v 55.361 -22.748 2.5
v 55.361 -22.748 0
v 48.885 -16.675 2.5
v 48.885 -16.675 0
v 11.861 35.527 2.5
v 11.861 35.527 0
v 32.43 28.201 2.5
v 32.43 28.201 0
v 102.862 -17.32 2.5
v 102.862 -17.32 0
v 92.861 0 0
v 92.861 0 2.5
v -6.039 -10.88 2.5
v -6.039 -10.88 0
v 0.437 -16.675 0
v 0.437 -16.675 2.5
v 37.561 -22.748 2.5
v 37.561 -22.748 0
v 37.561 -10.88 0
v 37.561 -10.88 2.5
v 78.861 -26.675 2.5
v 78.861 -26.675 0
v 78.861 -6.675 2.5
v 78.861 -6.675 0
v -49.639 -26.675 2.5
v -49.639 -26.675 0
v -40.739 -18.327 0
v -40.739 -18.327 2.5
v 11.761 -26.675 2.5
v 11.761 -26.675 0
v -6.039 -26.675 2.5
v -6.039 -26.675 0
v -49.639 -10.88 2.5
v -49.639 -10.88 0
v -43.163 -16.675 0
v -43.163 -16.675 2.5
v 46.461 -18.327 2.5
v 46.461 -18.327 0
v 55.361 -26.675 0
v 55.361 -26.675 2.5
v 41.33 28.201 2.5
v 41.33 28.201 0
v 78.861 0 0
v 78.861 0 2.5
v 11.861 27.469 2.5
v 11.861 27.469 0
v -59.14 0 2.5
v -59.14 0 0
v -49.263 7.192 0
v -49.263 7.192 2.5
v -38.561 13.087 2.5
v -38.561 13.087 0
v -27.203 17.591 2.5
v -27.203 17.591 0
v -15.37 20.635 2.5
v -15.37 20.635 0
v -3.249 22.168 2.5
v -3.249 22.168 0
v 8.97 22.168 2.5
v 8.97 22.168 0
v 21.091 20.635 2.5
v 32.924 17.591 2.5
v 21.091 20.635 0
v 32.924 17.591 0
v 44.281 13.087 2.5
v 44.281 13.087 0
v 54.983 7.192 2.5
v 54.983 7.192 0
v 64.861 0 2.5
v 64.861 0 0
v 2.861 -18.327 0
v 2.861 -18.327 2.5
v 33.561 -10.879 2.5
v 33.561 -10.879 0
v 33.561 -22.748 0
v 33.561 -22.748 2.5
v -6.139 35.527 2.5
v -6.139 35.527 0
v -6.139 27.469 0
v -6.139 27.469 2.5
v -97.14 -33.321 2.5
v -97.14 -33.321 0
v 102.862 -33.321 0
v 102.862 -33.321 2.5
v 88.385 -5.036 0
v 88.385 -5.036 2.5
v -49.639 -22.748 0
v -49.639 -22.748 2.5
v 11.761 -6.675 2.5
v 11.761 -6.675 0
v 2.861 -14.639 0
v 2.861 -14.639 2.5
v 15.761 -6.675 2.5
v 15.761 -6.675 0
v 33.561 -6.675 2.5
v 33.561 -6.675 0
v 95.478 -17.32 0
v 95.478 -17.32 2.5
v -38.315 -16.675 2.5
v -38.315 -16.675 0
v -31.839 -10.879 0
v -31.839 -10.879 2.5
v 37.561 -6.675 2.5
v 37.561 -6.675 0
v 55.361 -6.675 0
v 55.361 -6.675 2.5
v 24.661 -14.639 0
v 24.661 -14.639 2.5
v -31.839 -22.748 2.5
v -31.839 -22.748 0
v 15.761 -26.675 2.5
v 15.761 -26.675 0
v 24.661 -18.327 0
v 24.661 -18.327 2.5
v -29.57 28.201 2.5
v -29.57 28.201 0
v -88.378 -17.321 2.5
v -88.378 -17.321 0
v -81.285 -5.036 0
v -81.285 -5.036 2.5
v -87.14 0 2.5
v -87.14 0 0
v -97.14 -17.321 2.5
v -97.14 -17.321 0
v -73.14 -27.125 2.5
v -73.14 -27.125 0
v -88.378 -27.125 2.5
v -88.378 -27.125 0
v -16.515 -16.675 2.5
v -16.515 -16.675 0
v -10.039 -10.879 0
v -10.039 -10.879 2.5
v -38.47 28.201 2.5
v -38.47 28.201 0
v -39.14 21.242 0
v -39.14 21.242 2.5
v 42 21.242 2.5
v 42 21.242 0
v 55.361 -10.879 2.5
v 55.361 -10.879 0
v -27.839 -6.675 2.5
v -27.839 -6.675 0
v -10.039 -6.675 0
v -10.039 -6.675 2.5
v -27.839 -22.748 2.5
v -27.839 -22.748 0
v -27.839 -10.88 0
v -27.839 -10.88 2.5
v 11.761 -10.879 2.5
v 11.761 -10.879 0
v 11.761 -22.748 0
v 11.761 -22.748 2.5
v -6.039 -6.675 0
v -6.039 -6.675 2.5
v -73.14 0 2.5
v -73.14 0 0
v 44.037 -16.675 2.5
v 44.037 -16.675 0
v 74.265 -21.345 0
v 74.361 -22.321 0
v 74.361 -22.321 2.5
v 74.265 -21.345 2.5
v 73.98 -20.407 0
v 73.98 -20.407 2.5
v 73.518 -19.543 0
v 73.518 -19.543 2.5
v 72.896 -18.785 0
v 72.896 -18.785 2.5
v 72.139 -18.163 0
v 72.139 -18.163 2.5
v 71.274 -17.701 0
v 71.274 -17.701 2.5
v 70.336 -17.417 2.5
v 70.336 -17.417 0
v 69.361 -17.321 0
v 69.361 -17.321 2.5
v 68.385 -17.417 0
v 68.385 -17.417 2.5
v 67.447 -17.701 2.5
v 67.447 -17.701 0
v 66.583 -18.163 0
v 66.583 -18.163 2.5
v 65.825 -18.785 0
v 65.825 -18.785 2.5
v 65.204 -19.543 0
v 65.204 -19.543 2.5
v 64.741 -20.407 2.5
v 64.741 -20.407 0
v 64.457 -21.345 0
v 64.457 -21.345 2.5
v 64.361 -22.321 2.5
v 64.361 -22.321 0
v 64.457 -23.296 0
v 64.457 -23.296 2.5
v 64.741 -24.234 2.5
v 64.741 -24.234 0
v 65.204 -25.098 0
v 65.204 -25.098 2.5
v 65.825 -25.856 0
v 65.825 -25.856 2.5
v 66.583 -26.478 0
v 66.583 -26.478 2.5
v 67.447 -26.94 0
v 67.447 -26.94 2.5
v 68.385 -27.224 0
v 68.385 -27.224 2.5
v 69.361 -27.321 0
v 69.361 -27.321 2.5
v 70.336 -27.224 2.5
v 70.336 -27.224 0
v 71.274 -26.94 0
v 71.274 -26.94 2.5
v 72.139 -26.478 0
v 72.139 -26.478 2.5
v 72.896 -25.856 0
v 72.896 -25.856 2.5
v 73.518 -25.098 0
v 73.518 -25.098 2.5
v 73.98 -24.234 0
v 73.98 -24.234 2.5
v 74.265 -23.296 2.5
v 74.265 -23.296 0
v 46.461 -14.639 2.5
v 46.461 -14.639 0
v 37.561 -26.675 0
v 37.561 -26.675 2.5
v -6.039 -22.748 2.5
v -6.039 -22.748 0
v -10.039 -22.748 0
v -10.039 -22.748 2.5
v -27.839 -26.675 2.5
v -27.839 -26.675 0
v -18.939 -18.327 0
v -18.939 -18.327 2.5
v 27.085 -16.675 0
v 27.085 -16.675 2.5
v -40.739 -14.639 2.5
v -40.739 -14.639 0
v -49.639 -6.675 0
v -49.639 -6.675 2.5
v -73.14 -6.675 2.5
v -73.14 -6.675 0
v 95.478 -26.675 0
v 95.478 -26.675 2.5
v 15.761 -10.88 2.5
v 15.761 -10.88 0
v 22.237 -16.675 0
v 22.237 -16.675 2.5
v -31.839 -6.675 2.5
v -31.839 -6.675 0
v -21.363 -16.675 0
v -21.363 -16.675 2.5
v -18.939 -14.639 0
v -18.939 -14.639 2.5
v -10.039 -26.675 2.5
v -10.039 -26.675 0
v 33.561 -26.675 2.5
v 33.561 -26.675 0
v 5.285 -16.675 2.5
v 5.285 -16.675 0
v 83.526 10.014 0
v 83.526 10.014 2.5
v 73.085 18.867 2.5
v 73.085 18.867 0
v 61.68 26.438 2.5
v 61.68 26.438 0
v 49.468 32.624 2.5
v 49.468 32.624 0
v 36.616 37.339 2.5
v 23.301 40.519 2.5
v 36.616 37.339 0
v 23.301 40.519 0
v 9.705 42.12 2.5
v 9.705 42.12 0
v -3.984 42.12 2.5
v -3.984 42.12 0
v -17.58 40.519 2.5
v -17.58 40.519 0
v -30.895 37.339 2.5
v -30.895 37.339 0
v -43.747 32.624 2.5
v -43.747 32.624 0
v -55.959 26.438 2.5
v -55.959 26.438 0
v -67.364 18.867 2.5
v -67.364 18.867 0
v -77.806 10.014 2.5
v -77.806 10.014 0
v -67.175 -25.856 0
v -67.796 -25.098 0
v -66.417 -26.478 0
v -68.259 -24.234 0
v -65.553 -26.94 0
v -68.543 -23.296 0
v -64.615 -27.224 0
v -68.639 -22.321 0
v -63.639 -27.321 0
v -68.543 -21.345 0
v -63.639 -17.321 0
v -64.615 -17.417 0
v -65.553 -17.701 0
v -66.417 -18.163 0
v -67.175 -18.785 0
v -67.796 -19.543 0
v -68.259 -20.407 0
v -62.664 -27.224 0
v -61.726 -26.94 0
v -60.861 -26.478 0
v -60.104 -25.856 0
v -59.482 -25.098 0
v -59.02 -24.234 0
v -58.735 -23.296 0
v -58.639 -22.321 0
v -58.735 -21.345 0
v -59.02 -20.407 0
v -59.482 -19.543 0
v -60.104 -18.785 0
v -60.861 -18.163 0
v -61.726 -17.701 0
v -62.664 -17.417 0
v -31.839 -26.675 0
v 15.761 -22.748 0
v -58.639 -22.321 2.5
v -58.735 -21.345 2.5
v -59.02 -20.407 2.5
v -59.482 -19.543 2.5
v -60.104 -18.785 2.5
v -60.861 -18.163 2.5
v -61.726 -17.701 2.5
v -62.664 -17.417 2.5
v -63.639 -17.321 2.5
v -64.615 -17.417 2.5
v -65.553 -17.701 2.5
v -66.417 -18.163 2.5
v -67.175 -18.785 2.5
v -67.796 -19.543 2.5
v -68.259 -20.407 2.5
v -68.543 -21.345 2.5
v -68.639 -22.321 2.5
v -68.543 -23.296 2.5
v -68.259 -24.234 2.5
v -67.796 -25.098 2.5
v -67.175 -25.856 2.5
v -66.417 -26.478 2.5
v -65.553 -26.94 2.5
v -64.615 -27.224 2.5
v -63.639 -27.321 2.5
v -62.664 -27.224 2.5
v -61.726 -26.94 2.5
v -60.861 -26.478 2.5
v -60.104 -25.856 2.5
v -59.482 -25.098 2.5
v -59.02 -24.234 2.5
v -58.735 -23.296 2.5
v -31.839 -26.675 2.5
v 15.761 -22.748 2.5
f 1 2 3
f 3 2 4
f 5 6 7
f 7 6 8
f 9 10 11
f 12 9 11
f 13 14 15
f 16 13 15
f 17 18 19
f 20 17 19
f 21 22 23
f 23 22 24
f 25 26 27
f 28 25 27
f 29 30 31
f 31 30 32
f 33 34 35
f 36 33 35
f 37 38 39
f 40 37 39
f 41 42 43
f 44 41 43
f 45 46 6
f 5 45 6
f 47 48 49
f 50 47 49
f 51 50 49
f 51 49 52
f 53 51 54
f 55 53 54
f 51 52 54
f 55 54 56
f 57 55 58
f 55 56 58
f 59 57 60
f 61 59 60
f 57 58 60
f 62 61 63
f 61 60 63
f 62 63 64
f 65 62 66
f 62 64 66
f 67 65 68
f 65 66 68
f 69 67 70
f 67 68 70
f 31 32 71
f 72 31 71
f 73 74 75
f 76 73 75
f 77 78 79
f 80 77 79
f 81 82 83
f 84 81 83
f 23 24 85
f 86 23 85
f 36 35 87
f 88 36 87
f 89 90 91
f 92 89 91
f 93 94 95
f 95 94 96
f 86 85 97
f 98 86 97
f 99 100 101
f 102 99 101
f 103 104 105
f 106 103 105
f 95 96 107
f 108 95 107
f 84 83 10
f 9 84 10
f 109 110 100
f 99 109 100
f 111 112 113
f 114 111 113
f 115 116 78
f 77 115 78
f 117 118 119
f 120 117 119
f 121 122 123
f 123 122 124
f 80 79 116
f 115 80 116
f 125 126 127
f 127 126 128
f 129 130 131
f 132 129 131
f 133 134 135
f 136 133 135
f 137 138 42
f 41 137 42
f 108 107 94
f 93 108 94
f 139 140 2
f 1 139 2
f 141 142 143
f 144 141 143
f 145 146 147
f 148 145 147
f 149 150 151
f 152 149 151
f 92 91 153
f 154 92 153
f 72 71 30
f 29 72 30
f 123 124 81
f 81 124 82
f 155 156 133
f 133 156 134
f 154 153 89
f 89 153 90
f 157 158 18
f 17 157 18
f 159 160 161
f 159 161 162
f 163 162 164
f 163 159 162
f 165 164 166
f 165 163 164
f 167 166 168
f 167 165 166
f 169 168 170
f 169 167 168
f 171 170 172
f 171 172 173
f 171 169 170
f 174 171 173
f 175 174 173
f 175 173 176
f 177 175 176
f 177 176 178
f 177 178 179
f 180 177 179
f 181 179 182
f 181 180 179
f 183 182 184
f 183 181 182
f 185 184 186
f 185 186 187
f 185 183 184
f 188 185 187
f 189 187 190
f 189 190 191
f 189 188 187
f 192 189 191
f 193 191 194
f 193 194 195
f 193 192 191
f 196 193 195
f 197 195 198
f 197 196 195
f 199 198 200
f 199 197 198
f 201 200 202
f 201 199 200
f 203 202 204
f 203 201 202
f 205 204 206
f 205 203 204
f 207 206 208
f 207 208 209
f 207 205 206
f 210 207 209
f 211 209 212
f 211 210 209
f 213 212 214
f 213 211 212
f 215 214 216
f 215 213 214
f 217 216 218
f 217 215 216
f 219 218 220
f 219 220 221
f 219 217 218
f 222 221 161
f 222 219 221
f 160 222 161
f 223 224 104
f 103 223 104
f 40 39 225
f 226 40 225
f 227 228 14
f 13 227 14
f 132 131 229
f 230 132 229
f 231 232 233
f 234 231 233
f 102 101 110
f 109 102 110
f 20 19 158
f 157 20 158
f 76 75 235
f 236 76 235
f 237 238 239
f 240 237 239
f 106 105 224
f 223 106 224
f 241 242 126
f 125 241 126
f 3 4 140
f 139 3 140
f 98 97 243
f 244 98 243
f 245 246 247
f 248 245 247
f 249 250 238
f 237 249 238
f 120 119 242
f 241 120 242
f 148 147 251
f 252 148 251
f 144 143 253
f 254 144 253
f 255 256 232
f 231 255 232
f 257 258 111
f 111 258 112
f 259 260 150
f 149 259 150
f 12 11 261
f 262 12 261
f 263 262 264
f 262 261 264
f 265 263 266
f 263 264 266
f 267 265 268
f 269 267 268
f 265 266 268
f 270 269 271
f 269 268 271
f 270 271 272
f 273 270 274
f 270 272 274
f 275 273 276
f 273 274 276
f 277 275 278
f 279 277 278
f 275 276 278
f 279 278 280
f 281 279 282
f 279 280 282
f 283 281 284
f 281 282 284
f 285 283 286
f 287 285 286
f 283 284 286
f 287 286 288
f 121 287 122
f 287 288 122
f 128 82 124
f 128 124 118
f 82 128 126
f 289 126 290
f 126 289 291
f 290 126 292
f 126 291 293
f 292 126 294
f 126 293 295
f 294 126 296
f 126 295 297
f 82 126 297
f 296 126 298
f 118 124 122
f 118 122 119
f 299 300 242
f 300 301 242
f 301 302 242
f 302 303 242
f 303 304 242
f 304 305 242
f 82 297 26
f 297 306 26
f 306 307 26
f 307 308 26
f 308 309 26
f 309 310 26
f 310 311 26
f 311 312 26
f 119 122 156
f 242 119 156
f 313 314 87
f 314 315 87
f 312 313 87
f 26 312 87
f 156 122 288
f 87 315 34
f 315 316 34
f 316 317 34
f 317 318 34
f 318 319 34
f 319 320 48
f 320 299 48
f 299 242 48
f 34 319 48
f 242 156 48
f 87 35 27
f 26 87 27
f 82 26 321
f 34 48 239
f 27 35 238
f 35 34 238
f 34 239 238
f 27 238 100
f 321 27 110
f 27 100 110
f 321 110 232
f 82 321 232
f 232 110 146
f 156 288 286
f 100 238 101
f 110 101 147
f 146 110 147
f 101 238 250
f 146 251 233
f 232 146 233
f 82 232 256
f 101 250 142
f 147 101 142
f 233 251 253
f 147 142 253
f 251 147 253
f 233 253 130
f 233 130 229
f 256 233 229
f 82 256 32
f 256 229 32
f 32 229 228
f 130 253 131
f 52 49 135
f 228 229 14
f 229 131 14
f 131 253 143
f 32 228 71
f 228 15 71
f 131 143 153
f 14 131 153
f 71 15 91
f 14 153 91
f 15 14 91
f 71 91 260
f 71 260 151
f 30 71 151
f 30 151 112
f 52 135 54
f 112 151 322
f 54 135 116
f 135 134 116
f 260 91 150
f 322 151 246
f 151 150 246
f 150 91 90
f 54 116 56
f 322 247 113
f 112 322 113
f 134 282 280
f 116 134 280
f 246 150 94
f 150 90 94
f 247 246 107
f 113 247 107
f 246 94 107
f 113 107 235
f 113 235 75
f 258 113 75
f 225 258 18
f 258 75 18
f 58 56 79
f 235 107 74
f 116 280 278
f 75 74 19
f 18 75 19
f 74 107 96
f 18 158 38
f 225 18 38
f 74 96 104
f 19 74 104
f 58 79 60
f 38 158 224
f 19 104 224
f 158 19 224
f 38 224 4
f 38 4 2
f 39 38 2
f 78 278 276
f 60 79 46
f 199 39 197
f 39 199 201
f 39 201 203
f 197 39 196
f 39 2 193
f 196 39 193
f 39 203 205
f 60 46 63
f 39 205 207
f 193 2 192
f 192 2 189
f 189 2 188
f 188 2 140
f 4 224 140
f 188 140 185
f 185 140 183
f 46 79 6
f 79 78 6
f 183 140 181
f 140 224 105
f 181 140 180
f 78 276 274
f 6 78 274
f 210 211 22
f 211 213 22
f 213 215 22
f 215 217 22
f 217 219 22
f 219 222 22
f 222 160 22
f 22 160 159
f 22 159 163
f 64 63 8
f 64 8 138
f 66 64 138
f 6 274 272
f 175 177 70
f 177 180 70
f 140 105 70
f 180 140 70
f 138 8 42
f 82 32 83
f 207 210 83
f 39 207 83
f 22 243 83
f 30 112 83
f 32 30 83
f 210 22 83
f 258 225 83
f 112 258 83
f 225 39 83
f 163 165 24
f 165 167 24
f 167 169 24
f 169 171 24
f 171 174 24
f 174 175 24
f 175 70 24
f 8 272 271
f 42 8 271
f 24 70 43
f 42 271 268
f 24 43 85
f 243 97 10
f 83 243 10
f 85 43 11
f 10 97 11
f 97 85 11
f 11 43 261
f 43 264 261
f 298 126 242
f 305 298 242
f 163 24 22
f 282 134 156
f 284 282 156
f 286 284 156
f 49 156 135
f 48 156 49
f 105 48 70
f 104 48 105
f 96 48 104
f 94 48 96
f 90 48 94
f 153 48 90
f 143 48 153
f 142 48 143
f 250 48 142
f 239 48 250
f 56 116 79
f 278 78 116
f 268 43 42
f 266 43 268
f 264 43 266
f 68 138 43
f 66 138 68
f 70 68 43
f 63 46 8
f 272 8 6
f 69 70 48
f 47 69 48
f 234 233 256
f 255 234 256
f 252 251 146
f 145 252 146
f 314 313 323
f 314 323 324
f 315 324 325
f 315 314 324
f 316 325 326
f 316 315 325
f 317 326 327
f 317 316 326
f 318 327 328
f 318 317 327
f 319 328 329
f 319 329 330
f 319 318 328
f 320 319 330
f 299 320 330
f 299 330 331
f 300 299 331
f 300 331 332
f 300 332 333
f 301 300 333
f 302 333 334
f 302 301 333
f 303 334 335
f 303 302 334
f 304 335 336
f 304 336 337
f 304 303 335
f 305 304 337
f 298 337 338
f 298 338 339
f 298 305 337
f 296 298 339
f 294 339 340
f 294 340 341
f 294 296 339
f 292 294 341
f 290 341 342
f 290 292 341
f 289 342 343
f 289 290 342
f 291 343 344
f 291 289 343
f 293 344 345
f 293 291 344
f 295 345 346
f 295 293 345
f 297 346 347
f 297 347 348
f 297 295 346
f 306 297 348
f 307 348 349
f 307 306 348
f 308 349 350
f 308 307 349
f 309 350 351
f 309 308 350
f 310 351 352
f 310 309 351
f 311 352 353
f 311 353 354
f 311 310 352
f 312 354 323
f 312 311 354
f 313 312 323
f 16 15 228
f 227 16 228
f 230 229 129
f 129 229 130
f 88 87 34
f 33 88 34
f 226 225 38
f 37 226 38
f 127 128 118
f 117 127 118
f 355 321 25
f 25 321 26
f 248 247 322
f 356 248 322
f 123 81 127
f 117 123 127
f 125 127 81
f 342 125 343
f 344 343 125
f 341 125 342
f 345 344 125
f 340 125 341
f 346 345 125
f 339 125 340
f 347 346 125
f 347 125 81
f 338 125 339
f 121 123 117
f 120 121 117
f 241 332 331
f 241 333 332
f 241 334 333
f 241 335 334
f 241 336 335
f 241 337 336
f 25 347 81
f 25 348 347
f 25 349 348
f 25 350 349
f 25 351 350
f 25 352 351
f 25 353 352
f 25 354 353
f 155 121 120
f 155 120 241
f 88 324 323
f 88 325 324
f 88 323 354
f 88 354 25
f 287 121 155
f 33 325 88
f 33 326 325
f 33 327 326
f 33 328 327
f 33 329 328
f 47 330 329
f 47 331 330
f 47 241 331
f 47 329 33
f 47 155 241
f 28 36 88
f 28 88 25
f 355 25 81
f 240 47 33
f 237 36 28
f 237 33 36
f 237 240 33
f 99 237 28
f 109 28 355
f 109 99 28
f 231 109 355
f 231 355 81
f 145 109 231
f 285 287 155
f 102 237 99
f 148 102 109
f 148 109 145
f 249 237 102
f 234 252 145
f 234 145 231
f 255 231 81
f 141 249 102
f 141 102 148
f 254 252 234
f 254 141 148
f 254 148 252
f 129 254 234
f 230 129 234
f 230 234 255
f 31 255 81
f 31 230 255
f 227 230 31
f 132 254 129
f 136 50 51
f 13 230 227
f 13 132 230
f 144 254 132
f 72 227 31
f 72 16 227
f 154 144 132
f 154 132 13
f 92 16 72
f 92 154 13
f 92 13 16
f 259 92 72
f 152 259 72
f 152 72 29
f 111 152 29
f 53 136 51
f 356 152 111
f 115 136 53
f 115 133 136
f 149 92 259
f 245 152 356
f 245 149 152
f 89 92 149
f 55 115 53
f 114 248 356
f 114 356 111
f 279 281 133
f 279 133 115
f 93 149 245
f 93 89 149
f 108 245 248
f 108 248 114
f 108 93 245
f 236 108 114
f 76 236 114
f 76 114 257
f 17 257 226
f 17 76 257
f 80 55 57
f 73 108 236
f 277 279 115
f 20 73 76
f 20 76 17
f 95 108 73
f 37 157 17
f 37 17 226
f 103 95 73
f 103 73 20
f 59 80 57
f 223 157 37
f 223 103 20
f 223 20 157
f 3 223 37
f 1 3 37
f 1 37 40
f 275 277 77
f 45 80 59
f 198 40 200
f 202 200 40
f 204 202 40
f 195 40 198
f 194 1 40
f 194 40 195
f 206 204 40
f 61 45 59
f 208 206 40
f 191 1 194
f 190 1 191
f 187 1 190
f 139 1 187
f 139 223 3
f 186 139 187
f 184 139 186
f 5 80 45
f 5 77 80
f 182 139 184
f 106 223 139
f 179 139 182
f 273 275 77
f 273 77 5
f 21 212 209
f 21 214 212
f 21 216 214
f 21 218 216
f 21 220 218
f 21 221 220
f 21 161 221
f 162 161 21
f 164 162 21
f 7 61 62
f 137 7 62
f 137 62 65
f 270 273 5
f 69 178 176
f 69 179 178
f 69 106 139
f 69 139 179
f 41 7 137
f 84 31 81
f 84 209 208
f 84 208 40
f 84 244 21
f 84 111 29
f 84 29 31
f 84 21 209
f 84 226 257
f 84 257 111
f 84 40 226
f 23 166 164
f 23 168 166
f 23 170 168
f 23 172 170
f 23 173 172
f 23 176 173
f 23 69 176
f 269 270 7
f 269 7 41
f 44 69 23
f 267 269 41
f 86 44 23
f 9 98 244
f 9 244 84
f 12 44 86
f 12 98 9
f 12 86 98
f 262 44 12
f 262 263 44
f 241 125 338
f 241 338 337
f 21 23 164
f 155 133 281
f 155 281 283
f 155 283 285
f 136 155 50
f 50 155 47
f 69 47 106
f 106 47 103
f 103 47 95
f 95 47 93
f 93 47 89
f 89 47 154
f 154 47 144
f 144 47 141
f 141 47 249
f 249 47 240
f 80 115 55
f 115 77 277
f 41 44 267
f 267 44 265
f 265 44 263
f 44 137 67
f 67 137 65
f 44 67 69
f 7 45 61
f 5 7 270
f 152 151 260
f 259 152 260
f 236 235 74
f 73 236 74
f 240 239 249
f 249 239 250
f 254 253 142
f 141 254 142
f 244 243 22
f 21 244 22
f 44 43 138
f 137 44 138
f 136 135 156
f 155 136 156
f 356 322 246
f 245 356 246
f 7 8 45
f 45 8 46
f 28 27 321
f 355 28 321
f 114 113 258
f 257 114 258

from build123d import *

# Parameters (mm, degrees)
F0_R     = 5
F1_DEPTH = 2.5


with BuildPart() as f1:
    # F0 (on Top) → F1 (new body)
    with BuildSketch(Plane.XY):
        with BuildLine():
            Line((-97.14, -17.320508), (-97.14, -33.320508))
            Line((-97.14, -33.320508), (-63.639122, -33.320508))
            Line((-63.639122, -33.320508), (69.360878, -33.320508))
            Line((69.360878, -33.320508), (102.861755, -33.320508))
            Line((102.861755, -33.320508), (102.861755, -17.320001))
            Line((102.861755, -17.320001), (92.860878, 0))
            ThreePointArc((92.860878, 0), (2.860439, 42.320725), (-87.14, 0))
            Line((-87.14, 0), (-97.14, -17.320508))
        make_face()
        Polygon((-88.377581, -17.320508), (-81.28519, -5.036127), (-73.14, -6.674613), (-73.14, -27.124608), (-88.377581, -27.124608), align=None, mode=Mode.SUBTRACT)
        with Locations((-63.639122, -22.320508)):
            Circle(F0_R, mode=Mode.SUBTRACT)
        Polygon((-31.839122, -26.674613), (-49.639122, -26.674613), (-40.739122, -18.327324), align=None, mode=Mode.SUBTRACT)
        Polygon((-49.639122, -10.879502), (-43.163221, -16.674613), (-49.639122, -22.748346), align=None, mode=Mode.SUBTRACT)
        Polygon((-31.839122, -22.748346), (-38.315108, -16.674533), (-31.839122, -10.879346), align=None, mode=Mode.SUBTRACT)
        Polygon((-27.839122, -10.879502), (-21.363221, -16.674613), (-27.839122, -22.748346), align=None, mode=Mode.SUBTRACT)
        Polygon((-10.039122, -26.674613), (-27.839122, -26.674613), (-18.939122, -18.327324), align=None, mode=Mode.SUBTRACT)
        Polygon((11.760878, -26.674613), (-6.039122, -26.674613), (2.860878, -18.327324), align=None, mode=Mode.SUBTRACT)
        Polygon((-10.039122, -22.748346), (-16.515108, -16.674533), (-10.039122, -10.879346), align=None, mode=Mode.SUBTRACT)
        Polygon((-6.039122, -10.879502), (0.436779, -16.674613), (-6.039122, -22.748346), align=None, mode=Mode.SUBTRACT)
        Polygon((-40.739122, -14.638986), (-49.639122, -6.674613), (-31.839122, -6.674613), align=None, mode=Mode.SUBTRACT)
        Polygon((-27.839122, -6.674613), (-10.039122, -6.674613), (-18.939122, -14.638986), align=None, mode=Mode.SUBTRACT)
        Polygon((33.560878, -26.674613), (15.760878, -26.674613), (24.660878, -18.327324), align=None, mode=Mode.SUBTRACT)
        Polygon((11.760878, -22.748346), (5.284892, -16.674533), (11.760878, -10.879346), align=None, mode=Mode.SUBTRACT)
        Polygon((15.760878, -10.879502), (22.236779, -16.674613), (15.760878, -22.748346), align=None, mode=Mode.SUBTRACT)
        Polygon((55.360878, -26.674613), (37.560878, -26.674613), (46.460878, -18.327324), align=None, mode=Mode.SUBTRACT)
        Polygon((33.560878, -22.748346), (27.084892, -16.674533), (33.560878, -10.879346), align=None, mode=Mode.SUBTRACT)
        Polygon((37.560878, -10.879502), (44.036779, -16.674613), (37.560878, -22.748346), align=None, mode=Mode.SUBTRACT)
        Polygon((55.360878, -22.748346), (48.884892, -16.674533), (55.360878, -10.879346), align=None, mode=Mode.SUBTRACT)
        with Locations((69.360878, -22.320508)):
            Circle(F0_R, mode=Mode.SUBTRACT)
        Polygon((88.384643, -5.036127), (95.477571, -17.320001), (95.477571, -26.674613), (78.860878, -26.674613), (78.860878, -6.674613), align=None, mode=Mode.SUBTRACT)
        Polygon((-6.039122, -6.674613), (11.760878, -6.674613), (2.860878, -14.638986), align=None, mode=Mode.SUBTRACT)
        Polygon((15.760878, -6.674613), (33.560878, -6.674613), (24.660878, -14.638986), align=None, mode=Mode.SUBTRACT)
        Polygon((37.560878, -6.674613), (55.360878, -6.674613), (46.460878, -14.638986), align=None, mode=Mode.SUBTRACT)
        Polygon((-38.47, 28.201407), (-39.14, 21.242104), (-73.14, 0), align=None, mode=Mode.SUBTRACT)
        with BuildLine():
            ThreePointArc((-59.14, 0), (2.860439, 22.360707), (64.860878, 0))
            Line((64.860878, 0), (0, 0))
            Line((0, 0), (-59.14, 0))
        make_face(mode=Mode.SUBTRACT)
        Polygon((-29.57, 28.201407), (-6.139122, 35.526987), (-6.139122, 27.468849), align=None, mode=Mode.SUBTRACT)
        Polygon((78.860878, 0), (42.000439, 21.242104), (41.330439, 28.201407), align=None, mode=Mode.SUBTRACT)
        Polygon((11.860878, 27.468849), (11.860878, 35.526987), (32.430439, 28.201407), align=None, mode=Mode.SUBTRACT)
    extrude(amount=F1_DEPTH)


solid = f1.part
